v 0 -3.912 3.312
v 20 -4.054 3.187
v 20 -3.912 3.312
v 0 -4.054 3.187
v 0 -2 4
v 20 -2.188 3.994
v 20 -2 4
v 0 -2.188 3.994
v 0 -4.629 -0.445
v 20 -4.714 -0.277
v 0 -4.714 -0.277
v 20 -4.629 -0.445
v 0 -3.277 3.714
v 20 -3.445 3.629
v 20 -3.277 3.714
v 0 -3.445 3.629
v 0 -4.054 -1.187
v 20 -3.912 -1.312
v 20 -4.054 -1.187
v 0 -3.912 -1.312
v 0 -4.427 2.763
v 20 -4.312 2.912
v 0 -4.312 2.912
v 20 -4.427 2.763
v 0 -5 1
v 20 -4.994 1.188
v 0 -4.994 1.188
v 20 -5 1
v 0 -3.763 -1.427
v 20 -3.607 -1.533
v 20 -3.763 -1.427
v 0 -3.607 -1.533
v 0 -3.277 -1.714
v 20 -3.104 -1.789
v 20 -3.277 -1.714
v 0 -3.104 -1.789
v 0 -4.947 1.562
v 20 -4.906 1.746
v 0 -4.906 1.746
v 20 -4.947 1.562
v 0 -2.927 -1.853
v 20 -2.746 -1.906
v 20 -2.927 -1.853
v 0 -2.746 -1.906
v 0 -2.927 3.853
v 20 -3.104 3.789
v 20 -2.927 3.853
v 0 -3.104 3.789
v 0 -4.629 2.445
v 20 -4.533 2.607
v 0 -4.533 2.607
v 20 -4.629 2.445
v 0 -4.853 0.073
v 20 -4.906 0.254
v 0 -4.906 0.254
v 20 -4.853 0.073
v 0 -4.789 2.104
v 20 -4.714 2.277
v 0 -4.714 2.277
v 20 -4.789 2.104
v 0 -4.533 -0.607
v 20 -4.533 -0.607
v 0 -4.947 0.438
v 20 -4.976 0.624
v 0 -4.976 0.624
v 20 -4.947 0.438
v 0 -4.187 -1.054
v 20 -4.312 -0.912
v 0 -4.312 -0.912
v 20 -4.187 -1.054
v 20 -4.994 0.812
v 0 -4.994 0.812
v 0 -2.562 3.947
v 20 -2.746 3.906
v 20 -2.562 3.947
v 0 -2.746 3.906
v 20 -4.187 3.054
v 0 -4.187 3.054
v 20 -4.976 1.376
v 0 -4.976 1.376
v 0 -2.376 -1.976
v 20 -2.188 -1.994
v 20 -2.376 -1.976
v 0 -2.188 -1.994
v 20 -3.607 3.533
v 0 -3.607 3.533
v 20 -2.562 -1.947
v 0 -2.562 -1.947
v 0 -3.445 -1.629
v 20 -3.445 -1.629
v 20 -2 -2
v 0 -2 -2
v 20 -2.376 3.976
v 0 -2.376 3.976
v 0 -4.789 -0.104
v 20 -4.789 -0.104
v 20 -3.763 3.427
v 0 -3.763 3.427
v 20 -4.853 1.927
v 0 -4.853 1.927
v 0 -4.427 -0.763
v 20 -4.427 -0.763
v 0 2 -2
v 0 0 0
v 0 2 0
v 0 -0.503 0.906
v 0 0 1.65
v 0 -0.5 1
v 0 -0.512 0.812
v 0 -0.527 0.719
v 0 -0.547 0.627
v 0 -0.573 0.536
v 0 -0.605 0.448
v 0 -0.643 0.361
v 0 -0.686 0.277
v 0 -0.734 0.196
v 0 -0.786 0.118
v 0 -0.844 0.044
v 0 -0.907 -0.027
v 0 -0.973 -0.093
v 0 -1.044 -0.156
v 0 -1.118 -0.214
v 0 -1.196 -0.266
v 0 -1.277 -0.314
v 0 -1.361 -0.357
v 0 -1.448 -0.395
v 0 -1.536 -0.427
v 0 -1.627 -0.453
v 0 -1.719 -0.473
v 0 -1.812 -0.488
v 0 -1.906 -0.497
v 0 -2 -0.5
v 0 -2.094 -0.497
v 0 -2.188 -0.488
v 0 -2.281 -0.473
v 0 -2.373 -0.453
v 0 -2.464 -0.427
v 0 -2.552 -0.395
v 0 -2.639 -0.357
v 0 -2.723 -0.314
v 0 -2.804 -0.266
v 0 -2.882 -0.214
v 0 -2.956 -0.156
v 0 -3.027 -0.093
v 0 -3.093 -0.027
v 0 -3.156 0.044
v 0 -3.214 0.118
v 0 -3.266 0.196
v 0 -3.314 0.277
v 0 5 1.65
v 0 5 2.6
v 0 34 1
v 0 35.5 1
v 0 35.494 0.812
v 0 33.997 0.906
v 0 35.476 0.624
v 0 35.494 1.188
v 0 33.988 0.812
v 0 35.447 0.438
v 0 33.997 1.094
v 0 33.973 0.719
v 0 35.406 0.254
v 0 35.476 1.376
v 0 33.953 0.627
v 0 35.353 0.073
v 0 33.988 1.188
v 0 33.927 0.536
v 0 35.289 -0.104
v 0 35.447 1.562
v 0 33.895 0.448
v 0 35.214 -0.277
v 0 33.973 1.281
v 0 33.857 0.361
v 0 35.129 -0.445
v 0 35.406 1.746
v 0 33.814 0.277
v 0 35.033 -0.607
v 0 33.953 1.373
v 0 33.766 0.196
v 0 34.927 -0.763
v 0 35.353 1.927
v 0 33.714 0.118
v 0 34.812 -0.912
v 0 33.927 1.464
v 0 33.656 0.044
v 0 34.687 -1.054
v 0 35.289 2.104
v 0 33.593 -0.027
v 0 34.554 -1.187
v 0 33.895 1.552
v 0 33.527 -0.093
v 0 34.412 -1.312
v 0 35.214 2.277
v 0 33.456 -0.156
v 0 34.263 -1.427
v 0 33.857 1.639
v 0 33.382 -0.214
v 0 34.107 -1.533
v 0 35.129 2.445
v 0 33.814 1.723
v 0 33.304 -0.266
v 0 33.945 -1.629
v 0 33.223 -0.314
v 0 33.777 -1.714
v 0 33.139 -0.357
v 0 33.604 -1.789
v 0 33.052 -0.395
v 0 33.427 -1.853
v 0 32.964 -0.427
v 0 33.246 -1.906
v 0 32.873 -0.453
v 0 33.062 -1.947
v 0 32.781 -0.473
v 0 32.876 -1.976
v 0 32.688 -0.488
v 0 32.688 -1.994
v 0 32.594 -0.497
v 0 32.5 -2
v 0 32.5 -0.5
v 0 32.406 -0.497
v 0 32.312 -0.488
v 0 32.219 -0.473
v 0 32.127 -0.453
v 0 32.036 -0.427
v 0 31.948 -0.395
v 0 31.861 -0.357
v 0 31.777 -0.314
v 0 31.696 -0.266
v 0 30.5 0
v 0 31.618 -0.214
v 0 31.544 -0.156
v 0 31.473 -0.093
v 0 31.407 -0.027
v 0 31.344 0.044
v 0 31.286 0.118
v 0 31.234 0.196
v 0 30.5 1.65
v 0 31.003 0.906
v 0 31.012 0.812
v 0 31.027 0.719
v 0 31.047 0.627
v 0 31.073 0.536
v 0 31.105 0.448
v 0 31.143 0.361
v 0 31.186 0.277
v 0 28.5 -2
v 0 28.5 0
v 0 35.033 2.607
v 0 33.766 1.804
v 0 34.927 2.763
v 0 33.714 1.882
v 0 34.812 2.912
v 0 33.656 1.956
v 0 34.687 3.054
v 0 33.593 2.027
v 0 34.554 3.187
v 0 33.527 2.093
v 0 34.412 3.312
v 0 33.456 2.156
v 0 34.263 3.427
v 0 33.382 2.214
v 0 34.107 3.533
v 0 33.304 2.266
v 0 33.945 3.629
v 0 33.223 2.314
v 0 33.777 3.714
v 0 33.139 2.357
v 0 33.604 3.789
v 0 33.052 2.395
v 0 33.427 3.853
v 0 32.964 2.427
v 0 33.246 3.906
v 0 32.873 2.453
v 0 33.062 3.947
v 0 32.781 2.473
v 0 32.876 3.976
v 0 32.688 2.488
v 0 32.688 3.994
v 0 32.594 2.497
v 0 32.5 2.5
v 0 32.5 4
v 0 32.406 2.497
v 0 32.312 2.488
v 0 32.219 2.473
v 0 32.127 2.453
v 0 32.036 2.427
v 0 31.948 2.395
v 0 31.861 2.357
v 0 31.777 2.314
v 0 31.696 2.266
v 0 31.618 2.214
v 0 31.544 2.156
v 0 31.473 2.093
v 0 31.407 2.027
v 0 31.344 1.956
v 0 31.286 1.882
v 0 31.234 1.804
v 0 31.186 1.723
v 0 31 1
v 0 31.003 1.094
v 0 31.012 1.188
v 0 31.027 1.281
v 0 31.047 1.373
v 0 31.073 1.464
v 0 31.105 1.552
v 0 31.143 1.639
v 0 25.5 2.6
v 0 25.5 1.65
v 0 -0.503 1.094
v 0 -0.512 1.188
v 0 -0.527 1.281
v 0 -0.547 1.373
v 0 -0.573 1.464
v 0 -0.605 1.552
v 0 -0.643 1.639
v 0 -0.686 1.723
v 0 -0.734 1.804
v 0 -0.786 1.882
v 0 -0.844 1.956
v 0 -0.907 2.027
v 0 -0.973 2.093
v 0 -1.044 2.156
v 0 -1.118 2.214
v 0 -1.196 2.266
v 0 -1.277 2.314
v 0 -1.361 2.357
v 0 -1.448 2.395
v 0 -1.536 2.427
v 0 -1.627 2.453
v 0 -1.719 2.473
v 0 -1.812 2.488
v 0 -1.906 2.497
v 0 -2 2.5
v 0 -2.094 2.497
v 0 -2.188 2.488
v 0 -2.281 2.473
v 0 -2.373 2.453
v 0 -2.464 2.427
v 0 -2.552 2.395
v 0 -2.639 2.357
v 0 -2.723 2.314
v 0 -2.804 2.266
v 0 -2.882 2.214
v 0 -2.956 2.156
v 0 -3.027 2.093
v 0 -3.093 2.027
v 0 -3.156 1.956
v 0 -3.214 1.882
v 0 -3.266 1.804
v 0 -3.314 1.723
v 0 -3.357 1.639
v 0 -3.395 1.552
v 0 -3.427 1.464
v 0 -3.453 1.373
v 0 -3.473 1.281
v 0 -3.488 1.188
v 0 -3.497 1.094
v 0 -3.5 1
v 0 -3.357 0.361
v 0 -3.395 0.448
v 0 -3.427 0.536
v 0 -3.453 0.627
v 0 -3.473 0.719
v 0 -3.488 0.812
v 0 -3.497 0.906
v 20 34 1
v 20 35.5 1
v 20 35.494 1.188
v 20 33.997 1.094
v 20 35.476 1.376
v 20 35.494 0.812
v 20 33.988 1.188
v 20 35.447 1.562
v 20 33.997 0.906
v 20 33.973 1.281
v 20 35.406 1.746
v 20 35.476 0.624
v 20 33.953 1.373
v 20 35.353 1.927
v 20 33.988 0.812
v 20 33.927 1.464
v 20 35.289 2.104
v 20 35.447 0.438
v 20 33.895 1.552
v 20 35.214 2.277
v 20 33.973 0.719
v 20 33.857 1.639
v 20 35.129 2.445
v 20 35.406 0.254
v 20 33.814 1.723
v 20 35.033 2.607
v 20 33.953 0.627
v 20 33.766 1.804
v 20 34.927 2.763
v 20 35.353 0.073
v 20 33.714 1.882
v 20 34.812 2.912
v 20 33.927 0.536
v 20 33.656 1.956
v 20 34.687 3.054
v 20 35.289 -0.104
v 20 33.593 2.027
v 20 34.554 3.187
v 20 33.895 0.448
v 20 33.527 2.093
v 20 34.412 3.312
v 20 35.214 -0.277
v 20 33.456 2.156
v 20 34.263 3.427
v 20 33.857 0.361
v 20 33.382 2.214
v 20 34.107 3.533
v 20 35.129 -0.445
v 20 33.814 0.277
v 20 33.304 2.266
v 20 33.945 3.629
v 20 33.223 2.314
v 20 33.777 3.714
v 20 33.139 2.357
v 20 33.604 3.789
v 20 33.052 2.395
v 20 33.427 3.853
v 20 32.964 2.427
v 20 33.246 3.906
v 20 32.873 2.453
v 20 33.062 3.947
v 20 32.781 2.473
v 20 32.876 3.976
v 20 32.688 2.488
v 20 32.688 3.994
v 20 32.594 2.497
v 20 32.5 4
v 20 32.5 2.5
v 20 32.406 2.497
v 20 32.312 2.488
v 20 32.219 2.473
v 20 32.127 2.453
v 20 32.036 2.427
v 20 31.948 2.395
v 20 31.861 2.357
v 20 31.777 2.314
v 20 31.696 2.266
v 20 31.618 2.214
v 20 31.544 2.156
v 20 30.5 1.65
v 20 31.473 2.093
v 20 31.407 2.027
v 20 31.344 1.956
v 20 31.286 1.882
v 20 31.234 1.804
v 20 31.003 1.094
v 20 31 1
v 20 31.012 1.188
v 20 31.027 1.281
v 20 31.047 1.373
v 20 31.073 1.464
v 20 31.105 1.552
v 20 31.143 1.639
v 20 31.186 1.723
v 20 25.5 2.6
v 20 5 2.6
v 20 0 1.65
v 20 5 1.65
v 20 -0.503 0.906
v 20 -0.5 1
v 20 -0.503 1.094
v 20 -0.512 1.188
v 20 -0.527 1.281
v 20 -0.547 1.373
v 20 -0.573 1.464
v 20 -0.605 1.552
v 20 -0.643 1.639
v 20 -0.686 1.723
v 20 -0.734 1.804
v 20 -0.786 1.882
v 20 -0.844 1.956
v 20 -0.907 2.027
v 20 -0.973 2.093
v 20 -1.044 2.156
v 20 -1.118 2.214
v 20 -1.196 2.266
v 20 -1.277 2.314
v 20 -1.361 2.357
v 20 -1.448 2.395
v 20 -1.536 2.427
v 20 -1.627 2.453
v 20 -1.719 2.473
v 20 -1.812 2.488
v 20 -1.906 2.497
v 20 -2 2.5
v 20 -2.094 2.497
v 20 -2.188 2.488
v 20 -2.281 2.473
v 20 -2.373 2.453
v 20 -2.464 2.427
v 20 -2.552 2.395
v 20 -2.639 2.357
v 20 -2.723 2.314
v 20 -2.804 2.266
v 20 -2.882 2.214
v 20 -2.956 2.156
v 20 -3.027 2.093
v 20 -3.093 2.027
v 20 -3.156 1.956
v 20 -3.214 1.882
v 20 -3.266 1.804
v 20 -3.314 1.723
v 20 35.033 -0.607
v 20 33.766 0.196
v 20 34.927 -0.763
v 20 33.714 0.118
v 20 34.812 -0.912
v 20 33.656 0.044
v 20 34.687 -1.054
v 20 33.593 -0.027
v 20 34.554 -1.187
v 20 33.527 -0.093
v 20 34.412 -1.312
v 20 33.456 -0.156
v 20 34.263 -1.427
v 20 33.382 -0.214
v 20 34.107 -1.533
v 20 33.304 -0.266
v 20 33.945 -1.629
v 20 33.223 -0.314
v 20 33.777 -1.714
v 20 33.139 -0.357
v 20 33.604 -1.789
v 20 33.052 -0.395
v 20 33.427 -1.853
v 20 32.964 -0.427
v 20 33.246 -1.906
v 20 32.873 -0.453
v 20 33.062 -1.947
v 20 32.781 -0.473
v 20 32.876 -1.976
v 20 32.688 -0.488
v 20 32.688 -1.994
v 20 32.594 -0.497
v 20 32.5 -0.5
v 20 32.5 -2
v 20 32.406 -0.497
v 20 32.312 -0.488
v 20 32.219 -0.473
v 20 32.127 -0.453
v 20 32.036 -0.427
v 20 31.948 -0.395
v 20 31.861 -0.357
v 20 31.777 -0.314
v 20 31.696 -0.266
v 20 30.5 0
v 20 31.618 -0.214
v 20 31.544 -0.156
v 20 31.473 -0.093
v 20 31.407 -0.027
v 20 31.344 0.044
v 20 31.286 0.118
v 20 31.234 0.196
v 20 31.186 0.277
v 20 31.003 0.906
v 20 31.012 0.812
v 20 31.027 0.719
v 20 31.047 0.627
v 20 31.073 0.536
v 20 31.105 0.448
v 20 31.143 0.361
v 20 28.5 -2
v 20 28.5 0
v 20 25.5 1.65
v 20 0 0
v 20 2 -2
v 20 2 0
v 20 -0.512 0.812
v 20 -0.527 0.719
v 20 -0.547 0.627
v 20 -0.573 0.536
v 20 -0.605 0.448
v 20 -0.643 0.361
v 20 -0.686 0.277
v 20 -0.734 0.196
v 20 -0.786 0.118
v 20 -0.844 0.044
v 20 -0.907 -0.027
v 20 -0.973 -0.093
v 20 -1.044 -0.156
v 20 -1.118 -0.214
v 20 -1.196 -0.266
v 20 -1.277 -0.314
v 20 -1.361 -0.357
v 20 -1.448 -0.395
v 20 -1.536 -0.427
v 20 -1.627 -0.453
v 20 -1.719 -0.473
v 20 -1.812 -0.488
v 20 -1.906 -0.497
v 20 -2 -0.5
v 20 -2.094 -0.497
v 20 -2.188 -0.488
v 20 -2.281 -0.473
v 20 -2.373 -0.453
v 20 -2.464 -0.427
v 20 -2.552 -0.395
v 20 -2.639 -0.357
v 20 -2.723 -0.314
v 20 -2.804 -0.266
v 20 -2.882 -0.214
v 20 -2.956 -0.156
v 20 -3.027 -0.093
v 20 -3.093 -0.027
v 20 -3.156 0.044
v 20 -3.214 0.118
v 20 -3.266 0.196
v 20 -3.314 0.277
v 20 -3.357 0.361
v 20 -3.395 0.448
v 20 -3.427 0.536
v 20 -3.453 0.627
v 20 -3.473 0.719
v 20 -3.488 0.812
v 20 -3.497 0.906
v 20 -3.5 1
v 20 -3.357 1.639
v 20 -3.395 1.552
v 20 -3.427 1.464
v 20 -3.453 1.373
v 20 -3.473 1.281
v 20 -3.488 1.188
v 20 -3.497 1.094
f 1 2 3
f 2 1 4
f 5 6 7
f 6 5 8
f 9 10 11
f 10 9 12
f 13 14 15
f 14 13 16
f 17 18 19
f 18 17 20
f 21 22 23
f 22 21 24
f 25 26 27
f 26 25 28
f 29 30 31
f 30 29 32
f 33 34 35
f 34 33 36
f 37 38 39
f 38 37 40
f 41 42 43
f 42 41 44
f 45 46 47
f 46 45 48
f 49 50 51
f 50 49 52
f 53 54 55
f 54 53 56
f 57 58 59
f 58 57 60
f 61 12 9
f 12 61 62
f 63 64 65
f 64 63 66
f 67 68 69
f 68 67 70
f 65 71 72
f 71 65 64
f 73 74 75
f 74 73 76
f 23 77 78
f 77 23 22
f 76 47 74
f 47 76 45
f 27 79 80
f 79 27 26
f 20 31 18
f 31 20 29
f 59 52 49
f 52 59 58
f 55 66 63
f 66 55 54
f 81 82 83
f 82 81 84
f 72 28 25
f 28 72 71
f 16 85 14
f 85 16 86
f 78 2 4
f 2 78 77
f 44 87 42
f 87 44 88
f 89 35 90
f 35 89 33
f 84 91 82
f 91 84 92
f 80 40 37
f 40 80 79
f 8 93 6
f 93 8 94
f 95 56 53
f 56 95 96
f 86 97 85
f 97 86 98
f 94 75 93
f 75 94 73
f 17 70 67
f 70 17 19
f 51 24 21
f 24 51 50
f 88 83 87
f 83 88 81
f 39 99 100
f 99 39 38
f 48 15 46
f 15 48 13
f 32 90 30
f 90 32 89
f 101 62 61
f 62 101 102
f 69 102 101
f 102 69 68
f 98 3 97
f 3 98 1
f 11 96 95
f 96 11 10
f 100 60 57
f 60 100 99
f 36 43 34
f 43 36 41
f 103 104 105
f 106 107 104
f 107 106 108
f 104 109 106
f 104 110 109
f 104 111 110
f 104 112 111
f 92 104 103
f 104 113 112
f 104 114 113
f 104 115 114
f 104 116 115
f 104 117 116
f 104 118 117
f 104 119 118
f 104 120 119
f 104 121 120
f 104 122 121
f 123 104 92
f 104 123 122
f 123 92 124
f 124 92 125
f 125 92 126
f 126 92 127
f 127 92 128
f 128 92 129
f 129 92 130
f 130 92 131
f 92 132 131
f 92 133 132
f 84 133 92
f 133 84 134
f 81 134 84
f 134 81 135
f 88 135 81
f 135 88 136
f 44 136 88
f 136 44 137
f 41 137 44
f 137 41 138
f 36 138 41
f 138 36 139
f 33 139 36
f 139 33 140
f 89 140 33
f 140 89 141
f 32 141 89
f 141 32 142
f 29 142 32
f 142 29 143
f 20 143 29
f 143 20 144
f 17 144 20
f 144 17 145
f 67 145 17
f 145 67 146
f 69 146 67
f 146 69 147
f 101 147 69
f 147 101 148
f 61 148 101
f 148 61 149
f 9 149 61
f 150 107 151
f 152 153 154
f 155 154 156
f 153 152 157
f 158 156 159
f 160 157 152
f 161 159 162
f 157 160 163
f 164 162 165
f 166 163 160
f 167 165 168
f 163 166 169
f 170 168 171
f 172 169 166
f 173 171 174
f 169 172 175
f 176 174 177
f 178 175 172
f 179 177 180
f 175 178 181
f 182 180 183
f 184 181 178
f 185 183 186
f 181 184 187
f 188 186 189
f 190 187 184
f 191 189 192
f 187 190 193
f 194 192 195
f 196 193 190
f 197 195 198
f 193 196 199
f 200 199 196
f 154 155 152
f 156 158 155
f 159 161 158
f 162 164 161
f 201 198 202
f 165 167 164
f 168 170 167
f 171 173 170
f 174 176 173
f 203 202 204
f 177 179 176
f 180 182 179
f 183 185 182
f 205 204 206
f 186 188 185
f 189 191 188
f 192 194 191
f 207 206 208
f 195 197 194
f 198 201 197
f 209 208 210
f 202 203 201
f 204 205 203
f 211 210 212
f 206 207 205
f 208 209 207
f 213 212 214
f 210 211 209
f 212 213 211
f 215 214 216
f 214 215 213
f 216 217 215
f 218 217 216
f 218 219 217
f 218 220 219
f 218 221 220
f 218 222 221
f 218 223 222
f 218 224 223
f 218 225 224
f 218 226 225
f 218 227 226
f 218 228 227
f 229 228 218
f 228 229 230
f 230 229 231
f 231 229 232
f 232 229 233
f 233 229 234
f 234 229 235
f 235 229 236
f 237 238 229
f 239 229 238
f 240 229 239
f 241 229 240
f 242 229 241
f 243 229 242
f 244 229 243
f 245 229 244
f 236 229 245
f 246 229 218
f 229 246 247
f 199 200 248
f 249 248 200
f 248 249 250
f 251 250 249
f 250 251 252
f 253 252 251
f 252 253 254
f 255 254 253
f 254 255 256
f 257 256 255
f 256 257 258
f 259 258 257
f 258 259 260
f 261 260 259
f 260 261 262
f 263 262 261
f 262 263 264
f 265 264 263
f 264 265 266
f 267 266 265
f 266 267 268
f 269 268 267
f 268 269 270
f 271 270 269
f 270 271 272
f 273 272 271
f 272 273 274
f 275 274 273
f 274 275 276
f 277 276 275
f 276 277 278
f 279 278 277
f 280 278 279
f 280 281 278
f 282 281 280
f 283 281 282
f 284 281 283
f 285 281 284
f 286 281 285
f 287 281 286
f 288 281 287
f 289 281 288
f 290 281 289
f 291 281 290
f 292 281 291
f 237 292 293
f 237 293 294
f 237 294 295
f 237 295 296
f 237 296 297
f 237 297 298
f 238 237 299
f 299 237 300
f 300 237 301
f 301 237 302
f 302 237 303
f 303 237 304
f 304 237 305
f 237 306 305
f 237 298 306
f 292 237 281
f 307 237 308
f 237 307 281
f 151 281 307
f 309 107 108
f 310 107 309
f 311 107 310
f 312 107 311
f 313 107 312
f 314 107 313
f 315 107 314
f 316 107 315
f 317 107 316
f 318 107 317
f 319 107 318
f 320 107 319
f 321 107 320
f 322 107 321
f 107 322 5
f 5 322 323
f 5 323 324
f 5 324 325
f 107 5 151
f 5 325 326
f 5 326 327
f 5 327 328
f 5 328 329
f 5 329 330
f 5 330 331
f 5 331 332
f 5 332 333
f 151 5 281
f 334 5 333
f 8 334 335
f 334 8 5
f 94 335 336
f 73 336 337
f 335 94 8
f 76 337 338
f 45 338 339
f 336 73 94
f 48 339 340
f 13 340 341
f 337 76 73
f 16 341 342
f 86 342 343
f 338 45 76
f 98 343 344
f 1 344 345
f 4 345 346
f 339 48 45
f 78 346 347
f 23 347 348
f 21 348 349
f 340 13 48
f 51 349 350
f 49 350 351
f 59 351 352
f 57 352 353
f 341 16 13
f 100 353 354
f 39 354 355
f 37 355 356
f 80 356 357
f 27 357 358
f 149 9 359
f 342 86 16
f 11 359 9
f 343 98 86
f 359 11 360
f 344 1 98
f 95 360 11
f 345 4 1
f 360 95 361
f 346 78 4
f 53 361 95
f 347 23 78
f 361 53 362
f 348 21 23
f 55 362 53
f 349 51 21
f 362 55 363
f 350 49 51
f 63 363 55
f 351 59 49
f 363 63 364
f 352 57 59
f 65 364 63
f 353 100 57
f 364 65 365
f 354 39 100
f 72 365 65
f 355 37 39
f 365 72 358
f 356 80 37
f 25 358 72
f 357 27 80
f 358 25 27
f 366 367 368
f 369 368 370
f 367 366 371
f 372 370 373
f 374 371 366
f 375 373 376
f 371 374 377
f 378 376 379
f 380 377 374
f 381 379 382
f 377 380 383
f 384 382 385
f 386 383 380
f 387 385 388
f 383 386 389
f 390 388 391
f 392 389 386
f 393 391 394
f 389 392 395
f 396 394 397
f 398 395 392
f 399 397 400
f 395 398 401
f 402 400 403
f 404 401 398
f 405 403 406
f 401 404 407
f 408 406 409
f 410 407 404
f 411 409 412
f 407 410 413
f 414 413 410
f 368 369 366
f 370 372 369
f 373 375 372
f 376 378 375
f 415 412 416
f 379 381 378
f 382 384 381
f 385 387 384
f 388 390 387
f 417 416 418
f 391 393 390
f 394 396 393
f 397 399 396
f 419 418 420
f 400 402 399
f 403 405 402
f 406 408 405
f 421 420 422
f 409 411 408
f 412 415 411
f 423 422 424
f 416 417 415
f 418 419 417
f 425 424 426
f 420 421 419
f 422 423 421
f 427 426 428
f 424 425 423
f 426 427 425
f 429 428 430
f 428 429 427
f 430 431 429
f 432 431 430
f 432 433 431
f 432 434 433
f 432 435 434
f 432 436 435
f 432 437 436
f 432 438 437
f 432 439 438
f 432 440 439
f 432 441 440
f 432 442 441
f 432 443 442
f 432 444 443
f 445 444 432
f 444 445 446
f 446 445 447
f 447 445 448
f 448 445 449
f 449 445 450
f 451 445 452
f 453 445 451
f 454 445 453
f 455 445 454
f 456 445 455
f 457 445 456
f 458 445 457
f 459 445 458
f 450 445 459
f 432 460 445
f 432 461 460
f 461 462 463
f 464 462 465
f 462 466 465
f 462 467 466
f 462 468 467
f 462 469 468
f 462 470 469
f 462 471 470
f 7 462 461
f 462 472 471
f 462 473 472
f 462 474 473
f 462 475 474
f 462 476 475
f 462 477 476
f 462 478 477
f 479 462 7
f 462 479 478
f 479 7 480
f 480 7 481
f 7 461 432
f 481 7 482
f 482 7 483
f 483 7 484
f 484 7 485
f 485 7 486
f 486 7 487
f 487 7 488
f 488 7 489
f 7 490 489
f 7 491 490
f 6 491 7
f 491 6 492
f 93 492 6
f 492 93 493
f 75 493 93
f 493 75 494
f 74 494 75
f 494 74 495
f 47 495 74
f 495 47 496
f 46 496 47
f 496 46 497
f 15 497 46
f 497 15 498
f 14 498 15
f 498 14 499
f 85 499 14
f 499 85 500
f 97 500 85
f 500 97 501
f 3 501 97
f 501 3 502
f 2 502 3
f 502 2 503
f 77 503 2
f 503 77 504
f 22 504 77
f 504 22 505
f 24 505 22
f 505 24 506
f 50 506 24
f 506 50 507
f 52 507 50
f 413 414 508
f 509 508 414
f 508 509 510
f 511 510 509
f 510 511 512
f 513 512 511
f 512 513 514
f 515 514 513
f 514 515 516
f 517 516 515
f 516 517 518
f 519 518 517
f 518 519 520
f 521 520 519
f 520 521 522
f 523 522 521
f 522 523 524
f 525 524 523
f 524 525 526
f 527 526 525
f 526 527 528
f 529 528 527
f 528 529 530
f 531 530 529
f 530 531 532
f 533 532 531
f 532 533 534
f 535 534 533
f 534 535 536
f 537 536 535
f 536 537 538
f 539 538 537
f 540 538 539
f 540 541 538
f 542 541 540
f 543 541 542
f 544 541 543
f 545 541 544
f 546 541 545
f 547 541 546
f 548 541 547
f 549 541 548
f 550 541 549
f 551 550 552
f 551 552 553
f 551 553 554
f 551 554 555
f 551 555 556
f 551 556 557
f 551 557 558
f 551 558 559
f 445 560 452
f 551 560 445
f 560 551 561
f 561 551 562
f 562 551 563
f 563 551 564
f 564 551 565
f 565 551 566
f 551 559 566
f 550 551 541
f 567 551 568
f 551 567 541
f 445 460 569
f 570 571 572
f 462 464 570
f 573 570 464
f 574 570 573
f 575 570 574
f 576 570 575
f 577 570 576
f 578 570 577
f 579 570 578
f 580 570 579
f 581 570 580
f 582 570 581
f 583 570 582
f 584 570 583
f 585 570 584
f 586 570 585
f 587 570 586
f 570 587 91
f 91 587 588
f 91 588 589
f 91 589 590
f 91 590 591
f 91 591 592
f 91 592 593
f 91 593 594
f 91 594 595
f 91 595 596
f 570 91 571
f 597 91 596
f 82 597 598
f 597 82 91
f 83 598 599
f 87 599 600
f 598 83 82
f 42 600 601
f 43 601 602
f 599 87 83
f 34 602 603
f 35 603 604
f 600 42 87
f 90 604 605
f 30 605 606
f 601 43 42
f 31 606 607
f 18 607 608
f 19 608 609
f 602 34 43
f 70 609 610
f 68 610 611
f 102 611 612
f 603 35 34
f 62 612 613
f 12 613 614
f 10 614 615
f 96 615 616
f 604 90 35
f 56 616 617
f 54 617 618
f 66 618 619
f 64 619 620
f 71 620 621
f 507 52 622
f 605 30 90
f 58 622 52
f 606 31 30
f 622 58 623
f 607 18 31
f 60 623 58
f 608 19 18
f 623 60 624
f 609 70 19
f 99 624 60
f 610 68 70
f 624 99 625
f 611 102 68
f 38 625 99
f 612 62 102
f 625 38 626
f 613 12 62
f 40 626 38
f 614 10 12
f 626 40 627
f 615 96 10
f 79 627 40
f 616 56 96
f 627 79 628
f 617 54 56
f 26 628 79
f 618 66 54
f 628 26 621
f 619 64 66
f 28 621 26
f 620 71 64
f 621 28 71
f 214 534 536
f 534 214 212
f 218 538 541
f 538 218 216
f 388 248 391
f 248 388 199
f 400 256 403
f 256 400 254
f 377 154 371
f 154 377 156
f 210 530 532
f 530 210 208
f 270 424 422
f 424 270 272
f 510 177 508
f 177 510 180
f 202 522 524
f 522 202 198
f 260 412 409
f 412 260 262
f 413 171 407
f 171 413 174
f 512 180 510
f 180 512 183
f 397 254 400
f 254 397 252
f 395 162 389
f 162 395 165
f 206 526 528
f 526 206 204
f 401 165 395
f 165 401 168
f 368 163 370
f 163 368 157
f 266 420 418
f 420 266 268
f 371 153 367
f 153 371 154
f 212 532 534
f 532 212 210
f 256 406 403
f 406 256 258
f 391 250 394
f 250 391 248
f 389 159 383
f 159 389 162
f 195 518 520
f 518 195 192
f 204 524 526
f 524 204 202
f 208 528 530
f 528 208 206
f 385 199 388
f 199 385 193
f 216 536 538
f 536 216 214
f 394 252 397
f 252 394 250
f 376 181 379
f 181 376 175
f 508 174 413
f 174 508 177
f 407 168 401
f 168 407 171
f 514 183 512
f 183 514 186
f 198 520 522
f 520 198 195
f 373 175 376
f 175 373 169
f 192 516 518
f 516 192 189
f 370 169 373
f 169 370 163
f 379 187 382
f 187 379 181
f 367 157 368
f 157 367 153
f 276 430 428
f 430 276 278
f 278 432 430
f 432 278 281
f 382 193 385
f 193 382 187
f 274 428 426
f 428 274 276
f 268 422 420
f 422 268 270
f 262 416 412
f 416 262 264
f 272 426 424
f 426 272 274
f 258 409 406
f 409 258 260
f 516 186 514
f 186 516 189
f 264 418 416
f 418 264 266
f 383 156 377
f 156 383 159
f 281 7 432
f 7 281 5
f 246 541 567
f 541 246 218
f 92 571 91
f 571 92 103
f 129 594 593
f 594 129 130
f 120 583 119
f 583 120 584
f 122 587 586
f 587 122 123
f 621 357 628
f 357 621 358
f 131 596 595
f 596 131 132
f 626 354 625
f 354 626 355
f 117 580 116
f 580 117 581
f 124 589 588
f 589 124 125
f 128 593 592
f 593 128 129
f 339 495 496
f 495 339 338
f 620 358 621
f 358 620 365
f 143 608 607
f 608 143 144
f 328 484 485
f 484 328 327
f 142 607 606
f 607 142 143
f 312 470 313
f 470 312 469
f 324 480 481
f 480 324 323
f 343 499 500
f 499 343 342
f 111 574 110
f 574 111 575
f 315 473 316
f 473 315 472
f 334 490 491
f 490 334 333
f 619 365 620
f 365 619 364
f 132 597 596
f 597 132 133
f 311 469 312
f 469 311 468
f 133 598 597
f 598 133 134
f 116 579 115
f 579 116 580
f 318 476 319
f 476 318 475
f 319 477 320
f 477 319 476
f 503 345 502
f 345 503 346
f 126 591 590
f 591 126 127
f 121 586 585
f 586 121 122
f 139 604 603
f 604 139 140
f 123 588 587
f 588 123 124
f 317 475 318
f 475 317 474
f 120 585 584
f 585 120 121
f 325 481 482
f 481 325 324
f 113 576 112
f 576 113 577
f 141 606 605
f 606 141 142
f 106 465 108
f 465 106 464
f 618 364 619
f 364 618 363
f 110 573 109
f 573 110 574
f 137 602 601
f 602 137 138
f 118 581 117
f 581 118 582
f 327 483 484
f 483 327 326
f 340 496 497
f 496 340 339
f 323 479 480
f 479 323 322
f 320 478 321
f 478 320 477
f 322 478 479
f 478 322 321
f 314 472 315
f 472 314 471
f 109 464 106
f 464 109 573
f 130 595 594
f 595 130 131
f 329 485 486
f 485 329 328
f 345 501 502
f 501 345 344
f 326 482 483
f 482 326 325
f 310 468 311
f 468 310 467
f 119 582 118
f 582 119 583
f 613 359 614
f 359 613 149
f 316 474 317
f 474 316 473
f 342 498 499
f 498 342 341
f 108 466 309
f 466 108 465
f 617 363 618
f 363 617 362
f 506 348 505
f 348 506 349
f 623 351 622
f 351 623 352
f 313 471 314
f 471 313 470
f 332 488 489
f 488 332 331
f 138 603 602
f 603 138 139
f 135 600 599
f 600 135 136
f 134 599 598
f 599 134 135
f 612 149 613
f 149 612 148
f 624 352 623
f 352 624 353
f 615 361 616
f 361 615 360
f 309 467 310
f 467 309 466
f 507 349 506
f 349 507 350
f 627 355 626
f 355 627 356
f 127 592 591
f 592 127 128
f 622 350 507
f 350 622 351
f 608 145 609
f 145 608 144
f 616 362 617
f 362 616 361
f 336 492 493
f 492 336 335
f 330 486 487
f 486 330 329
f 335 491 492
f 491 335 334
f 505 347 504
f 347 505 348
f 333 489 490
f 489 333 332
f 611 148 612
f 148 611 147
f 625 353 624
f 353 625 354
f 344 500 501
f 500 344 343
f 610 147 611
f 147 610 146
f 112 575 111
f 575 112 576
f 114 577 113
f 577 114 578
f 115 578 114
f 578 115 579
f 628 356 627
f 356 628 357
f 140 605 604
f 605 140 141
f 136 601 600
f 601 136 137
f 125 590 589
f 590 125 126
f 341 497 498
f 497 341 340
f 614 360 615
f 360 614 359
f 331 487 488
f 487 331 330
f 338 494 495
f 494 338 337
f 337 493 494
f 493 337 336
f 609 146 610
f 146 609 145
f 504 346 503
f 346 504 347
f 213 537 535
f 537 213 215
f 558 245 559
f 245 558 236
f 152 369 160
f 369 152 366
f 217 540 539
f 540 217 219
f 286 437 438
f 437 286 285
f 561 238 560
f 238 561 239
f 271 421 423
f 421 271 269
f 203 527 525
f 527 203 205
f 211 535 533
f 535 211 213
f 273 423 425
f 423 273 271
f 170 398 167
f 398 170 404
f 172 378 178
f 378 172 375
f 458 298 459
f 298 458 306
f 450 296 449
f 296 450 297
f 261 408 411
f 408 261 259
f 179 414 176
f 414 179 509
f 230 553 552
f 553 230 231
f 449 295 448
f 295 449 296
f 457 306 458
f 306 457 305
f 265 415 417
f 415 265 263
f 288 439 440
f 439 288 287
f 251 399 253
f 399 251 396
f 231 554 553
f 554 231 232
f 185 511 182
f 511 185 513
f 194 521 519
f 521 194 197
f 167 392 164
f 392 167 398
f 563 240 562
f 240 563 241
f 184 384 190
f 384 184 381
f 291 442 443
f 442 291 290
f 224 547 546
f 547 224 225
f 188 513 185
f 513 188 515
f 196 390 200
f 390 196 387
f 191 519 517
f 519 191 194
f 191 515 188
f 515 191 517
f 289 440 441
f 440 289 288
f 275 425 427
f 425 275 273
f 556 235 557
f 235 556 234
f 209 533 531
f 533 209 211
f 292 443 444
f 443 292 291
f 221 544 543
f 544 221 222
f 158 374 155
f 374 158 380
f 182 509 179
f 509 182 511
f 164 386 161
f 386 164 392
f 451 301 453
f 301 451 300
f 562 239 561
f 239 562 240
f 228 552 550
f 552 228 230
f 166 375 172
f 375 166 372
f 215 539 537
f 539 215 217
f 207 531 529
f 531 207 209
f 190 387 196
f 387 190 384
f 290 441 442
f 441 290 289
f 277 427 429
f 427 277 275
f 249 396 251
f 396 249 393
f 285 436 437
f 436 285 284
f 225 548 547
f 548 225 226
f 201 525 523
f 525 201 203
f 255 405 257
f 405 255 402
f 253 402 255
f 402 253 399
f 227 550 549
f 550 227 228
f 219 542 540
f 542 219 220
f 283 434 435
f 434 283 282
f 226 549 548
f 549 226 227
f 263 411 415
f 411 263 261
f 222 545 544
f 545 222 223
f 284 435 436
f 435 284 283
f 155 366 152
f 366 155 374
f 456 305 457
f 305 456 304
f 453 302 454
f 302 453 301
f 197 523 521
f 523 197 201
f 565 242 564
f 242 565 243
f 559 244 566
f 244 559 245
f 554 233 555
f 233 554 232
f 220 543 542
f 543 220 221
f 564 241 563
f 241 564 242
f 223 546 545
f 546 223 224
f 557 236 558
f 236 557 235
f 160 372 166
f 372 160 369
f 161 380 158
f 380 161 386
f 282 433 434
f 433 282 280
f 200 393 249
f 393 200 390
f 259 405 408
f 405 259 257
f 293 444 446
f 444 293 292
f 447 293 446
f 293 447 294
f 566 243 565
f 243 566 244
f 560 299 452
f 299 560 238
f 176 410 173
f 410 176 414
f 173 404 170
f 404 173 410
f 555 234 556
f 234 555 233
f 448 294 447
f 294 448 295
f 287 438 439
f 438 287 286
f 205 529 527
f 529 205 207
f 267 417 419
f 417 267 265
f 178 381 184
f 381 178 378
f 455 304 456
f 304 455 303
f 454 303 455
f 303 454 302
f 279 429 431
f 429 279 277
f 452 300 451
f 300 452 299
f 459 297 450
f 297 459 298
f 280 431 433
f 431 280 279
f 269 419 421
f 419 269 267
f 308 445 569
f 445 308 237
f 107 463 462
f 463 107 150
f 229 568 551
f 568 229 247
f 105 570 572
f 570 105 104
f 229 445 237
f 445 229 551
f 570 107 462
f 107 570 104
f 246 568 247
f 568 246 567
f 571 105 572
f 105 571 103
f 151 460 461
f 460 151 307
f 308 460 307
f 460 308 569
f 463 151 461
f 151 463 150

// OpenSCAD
// file: utils.scad
module roundcube(size,r)
{
	scale([1,1,1/2])
	difference()
	{
		translate([r,r,0])
		minkowski()
		{
			cube([size[0]-2*r,size[1]-2*r,size[2]]);
			cylinder(h=size[2],r=r);
		}
	}
}
module chamfercube(size,chamf)
{
	difference()
	{
		cube(size);
		translate([size[0]/2,size[1]/2])
		for (i=[0:3])
		{
			translate([	cos(90*i)*(size[0]/2)-sin(90*i)*(size[0]/2),
						sin(90*i)*(size[1]/2)+cos(90*i)*(size[1]/2),0])
				cylinder(h=size[2],r=chamf,$fn=4);
		}
	}
}
// main file
$fn=100;
use <utils.scad>;
_d=12; d=9.45-0.25; dd=9.6+0.4;

/*
rod();
translate([-13/2+9.82/2,9.82+1,0])
	servo();*/
/*
rod();
translate([9.82/2,9.82+1,0])
	axelmount();
*/
nazemount();


module rod()
{
	side=9.85-0.03;
	chamfer=0.7+0.1;
	l=d*2+dd; //l=20;
	width=1;

	difference()
	{
		translate([-width,-width,0])
			chamfercube([side+2*width,side+2*width,l],chamfer+width/sqrt(2));
		chamfercube([side,side,l],chamfer);
	}
}

module servo()
{
	size=[13,26.35,16.3];
	chamfer=0.3; width=1;
	difference()
	{
		translate([-width,-width,0])
			chamfercube([size[0]+2*width,size[1]+2*width-3,size[2]],chamfer+width/sqrt(2));
		chamfercube(size,chamfer);
	}
}

module axelmount()
{
	hole=3.95; holeheight=5.6;
	chamfer=0.8*2;

	translate([0,holeheight+hole/2,0])
	difference()
	{
		for (i=[0:1])
		{
			translate([0,0,i*(d+dd)])
			{
				cylinder(h=d,d=_d);
				translate([-_d/2,-holeheight-hole/2,0])
					chamfercube([_d,holeheight+hole/2+chamfer/sqrt(2),d],chamfer);
			}
		}
		cylinder(h=2*d+dd+1,d=hole);
	}
}

module nazemount()
{
	size=[20,30+0.5,1.65]; hang=2;
	yplus=2; height=6; hstart=-2; dy=5; dz=2.6;

	difference()
	{
		union()
		{
			translate([0,-yplus,hstart])
				cube([size[0],size[1]+2*yplus,height]);
			for (i=[0:1])
			{
				translate([0,-yplus+i*(size[1]+2*yplus),(2*hstart+height)/2])
					rotate(90,[0,1,0])
						cylinder(h=size[0],d=height);
			}
		}
		cube(size);
		translate([0,hang,-10])
			cube([size[0],size[1]-2*hang,10]);
		translate([0,dy,0])
			cube([size[0],size[1]-2*dy,dz]);
		for (i=[0:1])
		{
			translate([0,-yplus+i*(size[1]+2*yplus),(2*hstart+height)/2])
				rotate(90,[0,1,0])
					cylinder(h=size[0],d=3);
		}
	}
}
